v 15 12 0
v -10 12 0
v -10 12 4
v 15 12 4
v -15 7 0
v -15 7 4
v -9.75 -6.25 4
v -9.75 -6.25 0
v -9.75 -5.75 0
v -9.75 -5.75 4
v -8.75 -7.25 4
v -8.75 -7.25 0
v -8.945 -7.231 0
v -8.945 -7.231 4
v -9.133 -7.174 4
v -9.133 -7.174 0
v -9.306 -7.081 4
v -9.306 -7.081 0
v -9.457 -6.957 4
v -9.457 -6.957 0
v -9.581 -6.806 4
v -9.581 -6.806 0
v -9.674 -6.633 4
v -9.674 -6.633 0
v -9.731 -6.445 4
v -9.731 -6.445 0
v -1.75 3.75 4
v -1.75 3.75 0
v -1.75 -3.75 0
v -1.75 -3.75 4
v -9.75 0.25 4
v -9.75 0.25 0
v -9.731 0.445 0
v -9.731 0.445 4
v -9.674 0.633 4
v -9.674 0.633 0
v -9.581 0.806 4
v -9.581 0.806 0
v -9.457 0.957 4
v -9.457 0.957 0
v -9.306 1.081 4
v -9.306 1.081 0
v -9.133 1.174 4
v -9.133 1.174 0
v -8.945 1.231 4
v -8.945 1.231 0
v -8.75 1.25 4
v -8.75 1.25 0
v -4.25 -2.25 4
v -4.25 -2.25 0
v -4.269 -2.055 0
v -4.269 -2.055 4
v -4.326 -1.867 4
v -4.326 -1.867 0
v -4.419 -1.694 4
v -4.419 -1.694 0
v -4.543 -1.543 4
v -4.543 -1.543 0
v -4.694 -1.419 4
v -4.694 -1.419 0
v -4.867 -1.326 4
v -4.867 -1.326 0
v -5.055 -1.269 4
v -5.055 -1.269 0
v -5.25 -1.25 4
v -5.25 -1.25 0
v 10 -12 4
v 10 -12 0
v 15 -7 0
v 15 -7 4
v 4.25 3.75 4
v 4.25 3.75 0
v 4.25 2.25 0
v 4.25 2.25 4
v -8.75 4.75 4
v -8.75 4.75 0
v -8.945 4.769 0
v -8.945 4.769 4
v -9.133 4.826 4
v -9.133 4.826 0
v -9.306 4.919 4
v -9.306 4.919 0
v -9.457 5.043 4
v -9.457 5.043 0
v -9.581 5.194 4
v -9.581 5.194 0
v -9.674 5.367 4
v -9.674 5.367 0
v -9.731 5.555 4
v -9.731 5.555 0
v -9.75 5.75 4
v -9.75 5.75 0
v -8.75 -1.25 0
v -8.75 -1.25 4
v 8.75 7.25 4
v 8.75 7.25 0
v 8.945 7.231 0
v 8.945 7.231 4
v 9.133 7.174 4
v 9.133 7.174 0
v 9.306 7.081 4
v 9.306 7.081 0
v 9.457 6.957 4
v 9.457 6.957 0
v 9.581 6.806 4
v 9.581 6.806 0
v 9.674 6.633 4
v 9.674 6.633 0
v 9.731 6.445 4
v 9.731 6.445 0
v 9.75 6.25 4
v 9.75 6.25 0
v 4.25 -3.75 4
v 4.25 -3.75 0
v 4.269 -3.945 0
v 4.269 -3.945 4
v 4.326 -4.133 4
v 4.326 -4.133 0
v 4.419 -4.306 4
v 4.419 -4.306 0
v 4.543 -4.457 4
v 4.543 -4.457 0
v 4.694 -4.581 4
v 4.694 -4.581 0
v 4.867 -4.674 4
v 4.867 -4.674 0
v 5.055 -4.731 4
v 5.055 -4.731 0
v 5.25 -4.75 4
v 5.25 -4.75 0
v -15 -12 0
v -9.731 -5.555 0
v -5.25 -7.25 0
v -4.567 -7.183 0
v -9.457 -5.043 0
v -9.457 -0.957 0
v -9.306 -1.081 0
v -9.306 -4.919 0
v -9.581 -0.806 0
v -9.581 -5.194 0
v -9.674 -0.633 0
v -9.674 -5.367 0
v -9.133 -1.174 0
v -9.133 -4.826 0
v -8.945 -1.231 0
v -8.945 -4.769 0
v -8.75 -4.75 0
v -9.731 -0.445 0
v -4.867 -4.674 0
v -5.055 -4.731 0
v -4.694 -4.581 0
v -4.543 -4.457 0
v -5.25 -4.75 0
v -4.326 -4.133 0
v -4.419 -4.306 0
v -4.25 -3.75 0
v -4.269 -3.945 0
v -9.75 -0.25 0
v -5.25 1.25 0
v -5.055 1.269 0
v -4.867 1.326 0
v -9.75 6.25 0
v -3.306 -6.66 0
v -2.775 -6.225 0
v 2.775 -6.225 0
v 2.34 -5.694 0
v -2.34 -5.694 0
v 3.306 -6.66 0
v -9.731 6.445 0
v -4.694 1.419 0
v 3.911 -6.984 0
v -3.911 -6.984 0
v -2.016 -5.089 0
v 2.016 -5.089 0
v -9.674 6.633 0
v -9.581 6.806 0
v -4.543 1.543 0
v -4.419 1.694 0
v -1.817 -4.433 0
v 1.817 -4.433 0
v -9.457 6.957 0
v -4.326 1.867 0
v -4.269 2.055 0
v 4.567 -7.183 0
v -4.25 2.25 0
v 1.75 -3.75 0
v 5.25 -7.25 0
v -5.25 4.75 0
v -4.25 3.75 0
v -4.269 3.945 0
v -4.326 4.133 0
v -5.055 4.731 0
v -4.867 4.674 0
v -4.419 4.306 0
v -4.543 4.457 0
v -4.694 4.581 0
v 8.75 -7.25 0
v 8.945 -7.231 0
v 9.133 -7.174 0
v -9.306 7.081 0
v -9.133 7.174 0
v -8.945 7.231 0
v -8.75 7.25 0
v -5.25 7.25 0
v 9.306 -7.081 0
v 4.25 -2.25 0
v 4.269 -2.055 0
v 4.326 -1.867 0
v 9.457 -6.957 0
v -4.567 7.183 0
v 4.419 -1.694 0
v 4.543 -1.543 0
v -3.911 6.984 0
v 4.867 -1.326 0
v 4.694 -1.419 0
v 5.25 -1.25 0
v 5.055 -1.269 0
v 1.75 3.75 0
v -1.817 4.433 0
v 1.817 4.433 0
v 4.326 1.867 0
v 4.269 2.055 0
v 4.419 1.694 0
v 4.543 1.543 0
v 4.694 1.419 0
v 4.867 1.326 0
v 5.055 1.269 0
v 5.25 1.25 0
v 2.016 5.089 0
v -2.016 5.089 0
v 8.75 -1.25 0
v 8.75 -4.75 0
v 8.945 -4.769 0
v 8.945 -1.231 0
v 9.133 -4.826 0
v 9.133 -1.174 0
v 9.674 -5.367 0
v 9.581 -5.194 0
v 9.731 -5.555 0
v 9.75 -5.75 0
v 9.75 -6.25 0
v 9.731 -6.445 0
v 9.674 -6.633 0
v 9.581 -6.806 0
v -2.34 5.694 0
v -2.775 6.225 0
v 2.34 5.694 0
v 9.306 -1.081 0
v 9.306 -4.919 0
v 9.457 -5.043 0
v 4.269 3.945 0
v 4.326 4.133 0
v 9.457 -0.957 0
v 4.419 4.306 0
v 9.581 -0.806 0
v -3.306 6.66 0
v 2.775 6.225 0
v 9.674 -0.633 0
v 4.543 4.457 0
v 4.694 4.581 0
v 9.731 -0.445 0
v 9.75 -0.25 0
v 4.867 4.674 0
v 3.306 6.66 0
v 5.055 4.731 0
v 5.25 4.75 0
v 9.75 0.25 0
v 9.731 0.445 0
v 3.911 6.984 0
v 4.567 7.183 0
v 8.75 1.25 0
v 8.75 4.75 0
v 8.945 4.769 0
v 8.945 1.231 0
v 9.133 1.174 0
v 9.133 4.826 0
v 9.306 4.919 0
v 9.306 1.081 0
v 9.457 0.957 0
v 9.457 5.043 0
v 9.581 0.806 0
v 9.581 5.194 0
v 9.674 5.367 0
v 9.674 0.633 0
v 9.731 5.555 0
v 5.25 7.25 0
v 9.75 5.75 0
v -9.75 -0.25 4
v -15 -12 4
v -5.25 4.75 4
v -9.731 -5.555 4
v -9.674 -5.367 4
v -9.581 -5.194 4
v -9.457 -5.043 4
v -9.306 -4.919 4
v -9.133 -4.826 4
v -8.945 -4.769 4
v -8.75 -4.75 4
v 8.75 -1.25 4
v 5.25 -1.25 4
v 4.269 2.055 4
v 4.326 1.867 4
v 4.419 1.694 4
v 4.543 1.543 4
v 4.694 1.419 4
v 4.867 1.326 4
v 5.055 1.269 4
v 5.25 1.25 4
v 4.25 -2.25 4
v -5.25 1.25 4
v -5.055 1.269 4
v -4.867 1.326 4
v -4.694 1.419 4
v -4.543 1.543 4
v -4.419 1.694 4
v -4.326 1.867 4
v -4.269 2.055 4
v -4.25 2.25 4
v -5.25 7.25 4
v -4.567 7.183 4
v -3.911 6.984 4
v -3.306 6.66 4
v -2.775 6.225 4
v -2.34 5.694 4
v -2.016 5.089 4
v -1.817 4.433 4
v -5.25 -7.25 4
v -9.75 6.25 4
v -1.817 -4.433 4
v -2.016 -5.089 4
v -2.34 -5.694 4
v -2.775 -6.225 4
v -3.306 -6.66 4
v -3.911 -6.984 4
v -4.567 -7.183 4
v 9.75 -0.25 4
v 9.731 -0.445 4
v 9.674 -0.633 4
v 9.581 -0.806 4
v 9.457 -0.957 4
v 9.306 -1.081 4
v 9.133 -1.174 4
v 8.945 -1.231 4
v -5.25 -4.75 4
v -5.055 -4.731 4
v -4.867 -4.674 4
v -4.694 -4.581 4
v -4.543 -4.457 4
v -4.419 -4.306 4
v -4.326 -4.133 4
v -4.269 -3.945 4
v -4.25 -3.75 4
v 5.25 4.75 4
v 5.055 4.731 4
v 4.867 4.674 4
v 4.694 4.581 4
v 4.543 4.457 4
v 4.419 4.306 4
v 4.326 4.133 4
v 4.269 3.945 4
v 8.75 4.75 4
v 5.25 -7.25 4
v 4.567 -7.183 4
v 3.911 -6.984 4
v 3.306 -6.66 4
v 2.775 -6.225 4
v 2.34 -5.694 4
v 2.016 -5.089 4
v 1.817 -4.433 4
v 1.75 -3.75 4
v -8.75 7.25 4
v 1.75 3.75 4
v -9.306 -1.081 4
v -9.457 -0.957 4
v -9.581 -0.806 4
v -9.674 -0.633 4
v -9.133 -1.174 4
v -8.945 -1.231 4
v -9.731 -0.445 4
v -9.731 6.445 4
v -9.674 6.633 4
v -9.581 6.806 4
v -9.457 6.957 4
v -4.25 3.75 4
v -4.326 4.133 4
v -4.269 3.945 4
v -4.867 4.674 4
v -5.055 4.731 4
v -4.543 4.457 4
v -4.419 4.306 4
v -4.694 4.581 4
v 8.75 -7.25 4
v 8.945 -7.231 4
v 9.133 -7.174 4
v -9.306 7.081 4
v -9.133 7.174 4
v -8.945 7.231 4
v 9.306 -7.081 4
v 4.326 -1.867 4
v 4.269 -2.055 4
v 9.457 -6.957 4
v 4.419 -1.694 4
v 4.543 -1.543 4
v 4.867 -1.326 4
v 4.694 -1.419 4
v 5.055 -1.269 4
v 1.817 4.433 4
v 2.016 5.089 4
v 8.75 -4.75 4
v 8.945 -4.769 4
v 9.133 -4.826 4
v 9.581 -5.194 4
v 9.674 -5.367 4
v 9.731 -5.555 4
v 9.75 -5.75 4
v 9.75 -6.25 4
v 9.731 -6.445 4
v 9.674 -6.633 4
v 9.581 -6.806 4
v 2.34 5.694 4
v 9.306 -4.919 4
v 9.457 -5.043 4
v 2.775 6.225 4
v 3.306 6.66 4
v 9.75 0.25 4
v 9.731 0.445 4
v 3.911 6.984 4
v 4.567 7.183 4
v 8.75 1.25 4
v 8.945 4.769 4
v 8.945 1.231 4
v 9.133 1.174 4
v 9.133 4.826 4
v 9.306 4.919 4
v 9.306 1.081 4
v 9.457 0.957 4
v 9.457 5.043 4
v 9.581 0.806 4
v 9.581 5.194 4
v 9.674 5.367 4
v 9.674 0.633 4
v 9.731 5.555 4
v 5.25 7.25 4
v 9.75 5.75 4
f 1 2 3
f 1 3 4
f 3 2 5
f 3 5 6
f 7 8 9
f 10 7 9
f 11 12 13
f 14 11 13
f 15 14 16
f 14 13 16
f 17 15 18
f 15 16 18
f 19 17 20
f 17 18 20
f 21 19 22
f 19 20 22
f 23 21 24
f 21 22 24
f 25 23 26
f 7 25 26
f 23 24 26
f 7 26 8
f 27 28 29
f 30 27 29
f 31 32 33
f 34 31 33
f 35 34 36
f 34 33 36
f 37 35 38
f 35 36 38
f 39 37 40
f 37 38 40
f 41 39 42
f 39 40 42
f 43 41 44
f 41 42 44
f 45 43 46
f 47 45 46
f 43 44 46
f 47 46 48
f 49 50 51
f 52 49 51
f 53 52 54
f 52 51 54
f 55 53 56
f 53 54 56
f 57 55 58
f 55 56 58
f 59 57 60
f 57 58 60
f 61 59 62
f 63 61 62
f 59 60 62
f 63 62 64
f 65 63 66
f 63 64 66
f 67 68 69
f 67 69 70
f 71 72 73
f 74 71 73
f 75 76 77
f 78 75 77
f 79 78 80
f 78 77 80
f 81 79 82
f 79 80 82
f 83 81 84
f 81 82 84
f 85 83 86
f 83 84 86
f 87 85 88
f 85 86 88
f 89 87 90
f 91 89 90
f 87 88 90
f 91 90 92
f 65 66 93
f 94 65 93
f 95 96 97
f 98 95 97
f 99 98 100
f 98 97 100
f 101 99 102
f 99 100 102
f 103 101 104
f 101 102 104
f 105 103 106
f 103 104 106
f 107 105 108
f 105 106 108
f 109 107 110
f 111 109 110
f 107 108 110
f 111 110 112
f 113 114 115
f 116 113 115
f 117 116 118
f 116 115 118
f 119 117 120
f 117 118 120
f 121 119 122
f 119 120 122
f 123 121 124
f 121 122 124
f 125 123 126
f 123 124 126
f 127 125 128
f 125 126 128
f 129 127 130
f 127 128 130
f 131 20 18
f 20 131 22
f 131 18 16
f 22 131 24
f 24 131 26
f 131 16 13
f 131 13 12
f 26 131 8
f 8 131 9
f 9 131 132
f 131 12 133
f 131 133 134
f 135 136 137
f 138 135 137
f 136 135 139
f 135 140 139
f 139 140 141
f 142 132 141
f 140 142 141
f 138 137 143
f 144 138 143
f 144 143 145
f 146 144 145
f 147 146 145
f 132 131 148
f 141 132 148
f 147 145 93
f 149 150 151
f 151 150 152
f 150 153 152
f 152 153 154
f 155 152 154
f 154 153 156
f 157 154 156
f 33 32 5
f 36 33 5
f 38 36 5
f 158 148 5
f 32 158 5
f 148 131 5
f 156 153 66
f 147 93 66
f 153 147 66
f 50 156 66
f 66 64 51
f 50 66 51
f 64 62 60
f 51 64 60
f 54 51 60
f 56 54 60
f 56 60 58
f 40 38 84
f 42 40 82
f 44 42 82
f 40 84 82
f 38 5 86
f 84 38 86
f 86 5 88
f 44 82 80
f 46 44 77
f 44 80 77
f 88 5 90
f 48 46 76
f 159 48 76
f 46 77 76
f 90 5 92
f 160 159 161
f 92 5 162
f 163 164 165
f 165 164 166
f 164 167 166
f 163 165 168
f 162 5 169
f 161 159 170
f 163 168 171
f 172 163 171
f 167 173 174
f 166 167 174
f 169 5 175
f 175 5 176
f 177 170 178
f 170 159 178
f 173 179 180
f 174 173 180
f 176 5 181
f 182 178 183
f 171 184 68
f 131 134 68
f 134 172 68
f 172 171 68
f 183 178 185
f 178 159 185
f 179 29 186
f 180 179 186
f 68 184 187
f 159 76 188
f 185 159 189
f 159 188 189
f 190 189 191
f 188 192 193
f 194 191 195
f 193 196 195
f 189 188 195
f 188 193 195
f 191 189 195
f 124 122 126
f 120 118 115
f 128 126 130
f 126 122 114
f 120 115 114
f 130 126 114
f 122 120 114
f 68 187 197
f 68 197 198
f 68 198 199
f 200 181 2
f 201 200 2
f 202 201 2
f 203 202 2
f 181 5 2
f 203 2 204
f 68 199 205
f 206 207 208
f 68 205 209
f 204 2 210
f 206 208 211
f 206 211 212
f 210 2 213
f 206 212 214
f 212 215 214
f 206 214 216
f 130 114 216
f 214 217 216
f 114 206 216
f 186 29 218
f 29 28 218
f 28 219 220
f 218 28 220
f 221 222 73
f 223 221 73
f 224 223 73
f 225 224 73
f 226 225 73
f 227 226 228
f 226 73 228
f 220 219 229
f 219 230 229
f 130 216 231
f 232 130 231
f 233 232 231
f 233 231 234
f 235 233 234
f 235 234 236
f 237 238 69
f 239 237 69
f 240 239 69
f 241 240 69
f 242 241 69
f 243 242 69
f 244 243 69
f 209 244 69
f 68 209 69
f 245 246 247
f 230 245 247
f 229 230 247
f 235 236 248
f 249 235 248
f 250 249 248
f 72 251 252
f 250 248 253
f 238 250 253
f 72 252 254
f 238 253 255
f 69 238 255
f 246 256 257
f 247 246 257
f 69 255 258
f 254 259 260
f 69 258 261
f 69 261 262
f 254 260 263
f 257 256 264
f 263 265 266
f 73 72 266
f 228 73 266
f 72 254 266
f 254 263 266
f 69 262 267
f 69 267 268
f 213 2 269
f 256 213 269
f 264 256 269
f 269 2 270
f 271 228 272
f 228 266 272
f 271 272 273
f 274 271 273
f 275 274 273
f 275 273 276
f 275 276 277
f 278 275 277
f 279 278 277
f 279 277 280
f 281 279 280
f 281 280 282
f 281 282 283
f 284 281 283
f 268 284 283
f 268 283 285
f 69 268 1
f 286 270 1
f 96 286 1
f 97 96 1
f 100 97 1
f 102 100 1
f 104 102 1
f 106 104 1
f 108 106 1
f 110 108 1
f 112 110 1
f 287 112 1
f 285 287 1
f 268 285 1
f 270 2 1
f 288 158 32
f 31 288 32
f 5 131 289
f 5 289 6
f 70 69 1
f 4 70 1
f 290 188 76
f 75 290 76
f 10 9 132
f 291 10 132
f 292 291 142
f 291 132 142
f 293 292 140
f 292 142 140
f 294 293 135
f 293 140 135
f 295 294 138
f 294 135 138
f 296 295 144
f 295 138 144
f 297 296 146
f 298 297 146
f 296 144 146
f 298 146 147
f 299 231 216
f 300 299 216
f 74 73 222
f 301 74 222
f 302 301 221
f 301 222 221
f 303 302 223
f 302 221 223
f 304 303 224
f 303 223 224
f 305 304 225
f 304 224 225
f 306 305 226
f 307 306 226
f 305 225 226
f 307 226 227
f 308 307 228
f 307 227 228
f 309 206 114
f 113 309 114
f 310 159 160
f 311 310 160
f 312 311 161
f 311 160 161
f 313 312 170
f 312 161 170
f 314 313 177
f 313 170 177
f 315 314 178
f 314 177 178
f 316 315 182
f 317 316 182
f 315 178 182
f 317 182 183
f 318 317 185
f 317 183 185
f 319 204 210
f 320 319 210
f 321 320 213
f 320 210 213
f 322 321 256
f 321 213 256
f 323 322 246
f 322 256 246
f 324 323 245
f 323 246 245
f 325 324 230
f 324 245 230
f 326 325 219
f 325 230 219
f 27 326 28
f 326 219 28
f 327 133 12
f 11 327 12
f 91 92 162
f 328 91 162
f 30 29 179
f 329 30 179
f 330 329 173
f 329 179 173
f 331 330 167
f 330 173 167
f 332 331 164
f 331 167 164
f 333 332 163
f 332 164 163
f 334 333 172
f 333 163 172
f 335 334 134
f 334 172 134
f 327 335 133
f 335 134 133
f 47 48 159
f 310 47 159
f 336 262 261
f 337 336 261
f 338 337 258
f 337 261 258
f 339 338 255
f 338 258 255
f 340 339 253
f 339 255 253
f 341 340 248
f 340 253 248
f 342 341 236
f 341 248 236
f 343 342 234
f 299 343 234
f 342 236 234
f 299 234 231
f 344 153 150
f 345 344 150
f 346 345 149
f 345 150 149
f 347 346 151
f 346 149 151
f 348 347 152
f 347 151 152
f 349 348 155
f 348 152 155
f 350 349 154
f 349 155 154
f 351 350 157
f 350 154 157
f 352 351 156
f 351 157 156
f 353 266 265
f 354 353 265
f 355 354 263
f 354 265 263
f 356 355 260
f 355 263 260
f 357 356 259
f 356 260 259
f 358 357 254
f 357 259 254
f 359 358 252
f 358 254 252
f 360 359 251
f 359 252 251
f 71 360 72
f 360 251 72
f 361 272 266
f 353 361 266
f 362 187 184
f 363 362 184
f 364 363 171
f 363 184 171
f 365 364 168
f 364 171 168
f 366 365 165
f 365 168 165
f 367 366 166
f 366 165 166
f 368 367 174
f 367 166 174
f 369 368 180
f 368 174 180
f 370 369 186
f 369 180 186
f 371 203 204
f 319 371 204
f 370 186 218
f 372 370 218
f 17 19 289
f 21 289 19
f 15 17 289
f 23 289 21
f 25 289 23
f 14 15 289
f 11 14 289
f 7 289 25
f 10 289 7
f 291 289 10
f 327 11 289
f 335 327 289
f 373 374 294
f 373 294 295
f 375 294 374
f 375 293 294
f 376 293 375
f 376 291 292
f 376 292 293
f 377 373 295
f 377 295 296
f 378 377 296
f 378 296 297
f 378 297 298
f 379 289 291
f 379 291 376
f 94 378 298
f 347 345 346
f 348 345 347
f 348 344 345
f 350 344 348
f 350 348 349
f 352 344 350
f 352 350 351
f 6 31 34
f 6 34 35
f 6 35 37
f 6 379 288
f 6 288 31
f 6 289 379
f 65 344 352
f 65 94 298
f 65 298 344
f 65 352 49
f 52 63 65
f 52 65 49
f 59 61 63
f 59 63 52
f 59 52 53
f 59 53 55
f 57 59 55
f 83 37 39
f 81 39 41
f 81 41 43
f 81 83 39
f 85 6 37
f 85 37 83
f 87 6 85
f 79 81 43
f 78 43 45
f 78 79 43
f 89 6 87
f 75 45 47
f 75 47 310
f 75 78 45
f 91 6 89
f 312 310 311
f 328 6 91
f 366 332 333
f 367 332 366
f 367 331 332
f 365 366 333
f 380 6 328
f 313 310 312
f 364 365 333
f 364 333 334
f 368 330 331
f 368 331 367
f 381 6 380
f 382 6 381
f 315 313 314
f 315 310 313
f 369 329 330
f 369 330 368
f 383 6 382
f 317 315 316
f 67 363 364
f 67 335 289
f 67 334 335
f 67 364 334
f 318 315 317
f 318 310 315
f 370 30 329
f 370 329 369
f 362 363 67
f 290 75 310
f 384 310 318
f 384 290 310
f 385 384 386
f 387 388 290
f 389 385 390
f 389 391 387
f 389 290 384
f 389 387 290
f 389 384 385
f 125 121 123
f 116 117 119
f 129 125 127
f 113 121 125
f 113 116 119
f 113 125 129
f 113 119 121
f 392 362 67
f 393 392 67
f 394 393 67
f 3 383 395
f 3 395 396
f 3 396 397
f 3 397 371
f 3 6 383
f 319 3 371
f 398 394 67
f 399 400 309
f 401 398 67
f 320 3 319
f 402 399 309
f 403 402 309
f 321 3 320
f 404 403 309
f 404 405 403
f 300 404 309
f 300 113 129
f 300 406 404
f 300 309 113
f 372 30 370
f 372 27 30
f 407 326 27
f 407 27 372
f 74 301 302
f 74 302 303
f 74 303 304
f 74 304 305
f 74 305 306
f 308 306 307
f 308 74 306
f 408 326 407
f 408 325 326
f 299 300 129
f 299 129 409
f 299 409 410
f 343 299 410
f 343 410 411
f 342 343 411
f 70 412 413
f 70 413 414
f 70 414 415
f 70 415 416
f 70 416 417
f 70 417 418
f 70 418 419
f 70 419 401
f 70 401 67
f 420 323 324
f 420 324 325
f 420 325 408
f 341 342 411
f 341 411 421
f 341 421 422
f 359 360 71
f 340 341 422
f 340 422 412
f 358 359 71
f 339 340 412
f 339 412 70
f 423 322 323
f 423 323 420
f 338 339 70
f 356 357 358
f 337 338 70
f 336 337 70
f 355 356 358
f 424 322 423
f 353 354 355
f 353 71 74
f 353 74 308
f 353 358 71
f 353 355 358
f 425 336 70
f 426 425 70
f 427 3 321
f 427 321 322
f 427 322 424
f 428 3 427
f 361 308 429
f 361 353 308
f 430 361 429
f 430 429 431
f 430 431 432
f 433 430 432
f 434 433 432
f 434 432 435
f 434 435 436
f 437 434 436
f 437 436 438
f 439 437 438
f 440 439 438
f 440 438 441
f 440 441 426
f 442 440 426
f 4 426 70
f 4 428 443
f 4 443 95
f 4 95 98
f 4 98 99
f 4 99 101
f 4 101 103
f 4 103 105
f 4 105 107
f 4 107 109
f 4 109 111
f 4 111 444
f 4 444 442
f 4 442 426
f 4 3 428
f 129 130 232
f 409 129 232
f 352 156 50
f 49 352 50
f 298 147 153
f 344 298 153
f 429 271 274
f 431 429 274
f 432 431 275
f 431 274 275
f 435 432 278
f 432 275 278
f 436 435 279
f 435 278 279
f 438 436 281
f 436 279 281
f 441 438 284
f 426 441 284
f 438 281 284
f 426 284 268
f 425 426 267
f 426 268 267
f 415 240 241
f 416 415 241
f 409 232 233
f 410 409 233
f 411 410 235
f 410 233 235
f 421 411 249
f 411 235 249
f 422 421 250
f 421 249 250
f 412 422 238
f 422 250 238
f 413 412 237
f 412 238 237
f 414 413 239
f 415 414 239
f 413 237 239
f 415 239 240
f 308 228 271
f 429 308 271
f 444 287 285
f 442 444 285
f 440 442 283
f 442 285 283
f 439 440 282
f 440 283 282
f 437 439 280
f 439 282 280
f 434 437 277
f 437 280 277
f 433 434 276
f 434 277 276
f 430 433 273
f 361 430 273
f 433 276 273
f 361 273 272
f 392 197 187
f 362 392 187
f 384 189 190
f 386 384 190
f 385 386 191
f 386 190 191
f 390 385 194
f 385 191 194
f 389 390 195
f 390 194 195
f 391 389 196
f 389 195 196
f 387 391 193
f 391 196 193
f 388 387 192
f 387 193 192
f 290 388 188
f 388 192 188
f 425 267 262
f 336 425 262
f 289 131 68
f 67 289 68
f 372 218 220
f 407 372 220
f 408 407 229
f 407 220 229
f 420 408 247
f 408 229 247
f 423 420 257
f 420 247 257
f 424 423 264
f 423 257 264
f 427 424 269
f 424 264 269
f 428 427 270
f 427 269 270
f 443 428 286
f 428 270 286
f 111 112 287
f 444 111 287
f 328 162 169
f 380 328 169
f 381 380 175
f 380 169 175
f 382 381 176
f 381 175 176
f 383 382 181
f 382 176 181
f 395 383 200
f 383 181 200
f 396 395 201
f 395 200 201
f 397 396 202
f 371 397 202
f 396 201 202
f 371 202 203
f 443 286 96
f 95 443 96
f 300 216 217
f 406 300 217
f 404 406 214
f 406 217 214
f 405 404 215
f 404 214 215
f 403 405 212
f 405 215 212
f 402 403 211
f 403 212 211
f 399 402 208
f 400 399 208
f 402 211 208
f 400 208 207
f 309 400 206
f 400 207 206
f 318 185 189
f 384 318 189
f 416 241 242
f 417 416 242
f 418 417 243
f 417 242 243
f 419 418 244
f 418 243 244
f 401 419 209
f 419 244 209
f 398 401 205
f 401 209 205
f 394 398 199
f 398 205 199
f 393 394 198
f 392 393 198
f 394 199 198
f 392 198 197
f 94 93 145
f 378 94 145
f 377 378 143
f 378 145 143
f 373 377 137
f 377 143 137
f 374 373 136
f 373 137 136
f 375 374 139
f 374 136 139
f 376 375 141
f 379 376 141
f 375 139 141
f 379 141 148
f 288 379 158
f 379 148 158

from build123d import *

# Parameters (mm, degrees)
F0_W     = 30
F0_H     = 24
F1_DEPTH = 4
F2_SIZE  = 5
F3_SIZE  = 5


with BuildPart() as f1:
    # F0 (on Top) → F1 (new body)
    with BuildSketch(Plane.XY):
        Rectangle(F0_W, F0_H)
        with BuildLine():
            Line((-8.75, 1.25), (-5.25, 1.25))
            ThreePointArc((-5.25, 1.25), (-4.542893, 1.542893), (-4.25, 2.25))
            Line((-4.25, 2.25), (-4.25, 3.75))
            ThreePointArc((-4.25, 3.75), (-4.542893, 4.457107), (-5.25, 4.75))
            Line((-5.25, 4.75), (-8.75, 4.75))
            ThreePointArc((-8.75, 4.75), (-9.457107, 5.042893), (-9.75, 5.75))
            Line((-9.75, 5.75), (-9.75, 6.25))
            ThreePointArc((-9.75, 6.25), (-9.457107, 6.957107), (-8.75, 7.25))
            Line((-8.75, 7.25), (-5.25, 7.25))
            ThreePointArc((-5.25, 7.25), (-2.775126, 6.224874), (-1.75, 3.75))
            Line((-1.75, 3.75), (-1.75, -3.75))
            ThreePointArc((-1.75, -3.75), (-2.775126, -6.224874), (-5.25, -7.25))
            Line((-5.25, -7.25), (-8.75, -7.25))
            ThreePointArc((-8.75, -7.25), (-9.457107, -6.957107), (-9.75, -6.25))
            Line((-9.75, -6.25), (-9.75, -5.75))
            ThreePointArc((-9.75, -5.75), (-9.457107, -5.042893), (-8.75, -4.75))
            Line((-8.75, -4.75), (-5.25, -4.75))
            ThreePointArc((-5.25, -4.75), (-4.542893, -4.457107), (-4.25, -3.75))
            Line((-4.25, -3.75), (-4.25, -2.25))
            ThreePointArc((-4.25, -2.25), (-4.542893, -1.542893), (-5.25, -1.25))
            Line((-5.25, -1.25), (-8.75, -1.25))
            ThreePointArc((-8.75, -1.25), (-9.457107, -0.957107), (-9.75, -0.25))
            Line((-9.75, -0.25), (-9.75, 0.25))
            ThreePointArc((-9.75, 0.25), (-9.457107, 0.957107), (-8.75, 1.25))
        make_face(mode=Mode.SUBTRACT)
        with BuildLine():
            ThreePointArc((1.75, 3.75), (2.775126, 6.224874), (5.25, 7.25))
            Line((5.25, 7.25), (8.75, 7.25))
            ThreePointArc((8.75, 7.25), (9.457107, 6.957107), (9.75, 6.25))
            Line((9.75, 6.25), (9.75, 5.75))
            ThreePointArc((9.75, 5.75), (9.457107, 5.042893), (8.75, 4.75))
            Line((8.75, 4.75), (5.25, 4.75))
            ThreePointArc((5.25, 4.75), (4.542893, 4.457107), (4.25, 3.75))
            Line((4.25, 3.75), (4.25, 2.25))
            ThreePointArc((4.25, 2.25), (4.542893, 1.542893), (5.25, 1.25))
            Line((5.25, 1.25), (8.75, 1.25))
            ThreePointArc((8.75, 1.25), (9.457107, 0.957107), (9.75, 0.25))
            Line((9.75, 0.25), (9.75, -0.25))
            ThreePointArc((9.75, -0.25), (9.457107, -0.957107), (8.75, -1.25))
            Line((8.75, -1.25), (5.25, -1.25))
            ThreePointArc((5.25, -1.25), (4.542893, -1.542893), (4.25, -2.25))
            Line((4.25, -2.25), (4.25, -3.75))
            ThreePointArc((4.25, -3.75), (4.542893, -4.457107), (5.25, -4.75))
            Line((5.25, -4.75), (8.75, -4.75))
            ThreePointArc((8.75, -4.75), (9.457107, -5.042893), (9.75, -5.75))
            Line((9.75, -5.75), (9.75, -6.25))
            ThreePointArc((9.75, -6.25), (9.457107, -6.957107), (8.75, -7.25))
            Line((8.75, -7.25), (5.25, -7.25))
            ThreePointArc((5.25, -7.25), (2.775126, -6.224874), (1.75, -3.75))
            Line((1.75, -3.75), (1.75, 3.75))
        make_face(mode=Mode.SUBTRACT)
    extrude(amount=F1_DEPTH)

    # F2
    f2_edges = [f1.edges().sort_by_distance(p)[0] for p in [
        (-15, 12, 2),
    ]]
    chamfer(f2_edges, length=F2_SIZE)

    # F3
    f3_edges = [f1.edges().sort_by_distance(p)[0] for p in [
        (15, -12, 2),
    ]]
    chamfer(f3_edges, length=F3_SIZE)


solid = f1.part
